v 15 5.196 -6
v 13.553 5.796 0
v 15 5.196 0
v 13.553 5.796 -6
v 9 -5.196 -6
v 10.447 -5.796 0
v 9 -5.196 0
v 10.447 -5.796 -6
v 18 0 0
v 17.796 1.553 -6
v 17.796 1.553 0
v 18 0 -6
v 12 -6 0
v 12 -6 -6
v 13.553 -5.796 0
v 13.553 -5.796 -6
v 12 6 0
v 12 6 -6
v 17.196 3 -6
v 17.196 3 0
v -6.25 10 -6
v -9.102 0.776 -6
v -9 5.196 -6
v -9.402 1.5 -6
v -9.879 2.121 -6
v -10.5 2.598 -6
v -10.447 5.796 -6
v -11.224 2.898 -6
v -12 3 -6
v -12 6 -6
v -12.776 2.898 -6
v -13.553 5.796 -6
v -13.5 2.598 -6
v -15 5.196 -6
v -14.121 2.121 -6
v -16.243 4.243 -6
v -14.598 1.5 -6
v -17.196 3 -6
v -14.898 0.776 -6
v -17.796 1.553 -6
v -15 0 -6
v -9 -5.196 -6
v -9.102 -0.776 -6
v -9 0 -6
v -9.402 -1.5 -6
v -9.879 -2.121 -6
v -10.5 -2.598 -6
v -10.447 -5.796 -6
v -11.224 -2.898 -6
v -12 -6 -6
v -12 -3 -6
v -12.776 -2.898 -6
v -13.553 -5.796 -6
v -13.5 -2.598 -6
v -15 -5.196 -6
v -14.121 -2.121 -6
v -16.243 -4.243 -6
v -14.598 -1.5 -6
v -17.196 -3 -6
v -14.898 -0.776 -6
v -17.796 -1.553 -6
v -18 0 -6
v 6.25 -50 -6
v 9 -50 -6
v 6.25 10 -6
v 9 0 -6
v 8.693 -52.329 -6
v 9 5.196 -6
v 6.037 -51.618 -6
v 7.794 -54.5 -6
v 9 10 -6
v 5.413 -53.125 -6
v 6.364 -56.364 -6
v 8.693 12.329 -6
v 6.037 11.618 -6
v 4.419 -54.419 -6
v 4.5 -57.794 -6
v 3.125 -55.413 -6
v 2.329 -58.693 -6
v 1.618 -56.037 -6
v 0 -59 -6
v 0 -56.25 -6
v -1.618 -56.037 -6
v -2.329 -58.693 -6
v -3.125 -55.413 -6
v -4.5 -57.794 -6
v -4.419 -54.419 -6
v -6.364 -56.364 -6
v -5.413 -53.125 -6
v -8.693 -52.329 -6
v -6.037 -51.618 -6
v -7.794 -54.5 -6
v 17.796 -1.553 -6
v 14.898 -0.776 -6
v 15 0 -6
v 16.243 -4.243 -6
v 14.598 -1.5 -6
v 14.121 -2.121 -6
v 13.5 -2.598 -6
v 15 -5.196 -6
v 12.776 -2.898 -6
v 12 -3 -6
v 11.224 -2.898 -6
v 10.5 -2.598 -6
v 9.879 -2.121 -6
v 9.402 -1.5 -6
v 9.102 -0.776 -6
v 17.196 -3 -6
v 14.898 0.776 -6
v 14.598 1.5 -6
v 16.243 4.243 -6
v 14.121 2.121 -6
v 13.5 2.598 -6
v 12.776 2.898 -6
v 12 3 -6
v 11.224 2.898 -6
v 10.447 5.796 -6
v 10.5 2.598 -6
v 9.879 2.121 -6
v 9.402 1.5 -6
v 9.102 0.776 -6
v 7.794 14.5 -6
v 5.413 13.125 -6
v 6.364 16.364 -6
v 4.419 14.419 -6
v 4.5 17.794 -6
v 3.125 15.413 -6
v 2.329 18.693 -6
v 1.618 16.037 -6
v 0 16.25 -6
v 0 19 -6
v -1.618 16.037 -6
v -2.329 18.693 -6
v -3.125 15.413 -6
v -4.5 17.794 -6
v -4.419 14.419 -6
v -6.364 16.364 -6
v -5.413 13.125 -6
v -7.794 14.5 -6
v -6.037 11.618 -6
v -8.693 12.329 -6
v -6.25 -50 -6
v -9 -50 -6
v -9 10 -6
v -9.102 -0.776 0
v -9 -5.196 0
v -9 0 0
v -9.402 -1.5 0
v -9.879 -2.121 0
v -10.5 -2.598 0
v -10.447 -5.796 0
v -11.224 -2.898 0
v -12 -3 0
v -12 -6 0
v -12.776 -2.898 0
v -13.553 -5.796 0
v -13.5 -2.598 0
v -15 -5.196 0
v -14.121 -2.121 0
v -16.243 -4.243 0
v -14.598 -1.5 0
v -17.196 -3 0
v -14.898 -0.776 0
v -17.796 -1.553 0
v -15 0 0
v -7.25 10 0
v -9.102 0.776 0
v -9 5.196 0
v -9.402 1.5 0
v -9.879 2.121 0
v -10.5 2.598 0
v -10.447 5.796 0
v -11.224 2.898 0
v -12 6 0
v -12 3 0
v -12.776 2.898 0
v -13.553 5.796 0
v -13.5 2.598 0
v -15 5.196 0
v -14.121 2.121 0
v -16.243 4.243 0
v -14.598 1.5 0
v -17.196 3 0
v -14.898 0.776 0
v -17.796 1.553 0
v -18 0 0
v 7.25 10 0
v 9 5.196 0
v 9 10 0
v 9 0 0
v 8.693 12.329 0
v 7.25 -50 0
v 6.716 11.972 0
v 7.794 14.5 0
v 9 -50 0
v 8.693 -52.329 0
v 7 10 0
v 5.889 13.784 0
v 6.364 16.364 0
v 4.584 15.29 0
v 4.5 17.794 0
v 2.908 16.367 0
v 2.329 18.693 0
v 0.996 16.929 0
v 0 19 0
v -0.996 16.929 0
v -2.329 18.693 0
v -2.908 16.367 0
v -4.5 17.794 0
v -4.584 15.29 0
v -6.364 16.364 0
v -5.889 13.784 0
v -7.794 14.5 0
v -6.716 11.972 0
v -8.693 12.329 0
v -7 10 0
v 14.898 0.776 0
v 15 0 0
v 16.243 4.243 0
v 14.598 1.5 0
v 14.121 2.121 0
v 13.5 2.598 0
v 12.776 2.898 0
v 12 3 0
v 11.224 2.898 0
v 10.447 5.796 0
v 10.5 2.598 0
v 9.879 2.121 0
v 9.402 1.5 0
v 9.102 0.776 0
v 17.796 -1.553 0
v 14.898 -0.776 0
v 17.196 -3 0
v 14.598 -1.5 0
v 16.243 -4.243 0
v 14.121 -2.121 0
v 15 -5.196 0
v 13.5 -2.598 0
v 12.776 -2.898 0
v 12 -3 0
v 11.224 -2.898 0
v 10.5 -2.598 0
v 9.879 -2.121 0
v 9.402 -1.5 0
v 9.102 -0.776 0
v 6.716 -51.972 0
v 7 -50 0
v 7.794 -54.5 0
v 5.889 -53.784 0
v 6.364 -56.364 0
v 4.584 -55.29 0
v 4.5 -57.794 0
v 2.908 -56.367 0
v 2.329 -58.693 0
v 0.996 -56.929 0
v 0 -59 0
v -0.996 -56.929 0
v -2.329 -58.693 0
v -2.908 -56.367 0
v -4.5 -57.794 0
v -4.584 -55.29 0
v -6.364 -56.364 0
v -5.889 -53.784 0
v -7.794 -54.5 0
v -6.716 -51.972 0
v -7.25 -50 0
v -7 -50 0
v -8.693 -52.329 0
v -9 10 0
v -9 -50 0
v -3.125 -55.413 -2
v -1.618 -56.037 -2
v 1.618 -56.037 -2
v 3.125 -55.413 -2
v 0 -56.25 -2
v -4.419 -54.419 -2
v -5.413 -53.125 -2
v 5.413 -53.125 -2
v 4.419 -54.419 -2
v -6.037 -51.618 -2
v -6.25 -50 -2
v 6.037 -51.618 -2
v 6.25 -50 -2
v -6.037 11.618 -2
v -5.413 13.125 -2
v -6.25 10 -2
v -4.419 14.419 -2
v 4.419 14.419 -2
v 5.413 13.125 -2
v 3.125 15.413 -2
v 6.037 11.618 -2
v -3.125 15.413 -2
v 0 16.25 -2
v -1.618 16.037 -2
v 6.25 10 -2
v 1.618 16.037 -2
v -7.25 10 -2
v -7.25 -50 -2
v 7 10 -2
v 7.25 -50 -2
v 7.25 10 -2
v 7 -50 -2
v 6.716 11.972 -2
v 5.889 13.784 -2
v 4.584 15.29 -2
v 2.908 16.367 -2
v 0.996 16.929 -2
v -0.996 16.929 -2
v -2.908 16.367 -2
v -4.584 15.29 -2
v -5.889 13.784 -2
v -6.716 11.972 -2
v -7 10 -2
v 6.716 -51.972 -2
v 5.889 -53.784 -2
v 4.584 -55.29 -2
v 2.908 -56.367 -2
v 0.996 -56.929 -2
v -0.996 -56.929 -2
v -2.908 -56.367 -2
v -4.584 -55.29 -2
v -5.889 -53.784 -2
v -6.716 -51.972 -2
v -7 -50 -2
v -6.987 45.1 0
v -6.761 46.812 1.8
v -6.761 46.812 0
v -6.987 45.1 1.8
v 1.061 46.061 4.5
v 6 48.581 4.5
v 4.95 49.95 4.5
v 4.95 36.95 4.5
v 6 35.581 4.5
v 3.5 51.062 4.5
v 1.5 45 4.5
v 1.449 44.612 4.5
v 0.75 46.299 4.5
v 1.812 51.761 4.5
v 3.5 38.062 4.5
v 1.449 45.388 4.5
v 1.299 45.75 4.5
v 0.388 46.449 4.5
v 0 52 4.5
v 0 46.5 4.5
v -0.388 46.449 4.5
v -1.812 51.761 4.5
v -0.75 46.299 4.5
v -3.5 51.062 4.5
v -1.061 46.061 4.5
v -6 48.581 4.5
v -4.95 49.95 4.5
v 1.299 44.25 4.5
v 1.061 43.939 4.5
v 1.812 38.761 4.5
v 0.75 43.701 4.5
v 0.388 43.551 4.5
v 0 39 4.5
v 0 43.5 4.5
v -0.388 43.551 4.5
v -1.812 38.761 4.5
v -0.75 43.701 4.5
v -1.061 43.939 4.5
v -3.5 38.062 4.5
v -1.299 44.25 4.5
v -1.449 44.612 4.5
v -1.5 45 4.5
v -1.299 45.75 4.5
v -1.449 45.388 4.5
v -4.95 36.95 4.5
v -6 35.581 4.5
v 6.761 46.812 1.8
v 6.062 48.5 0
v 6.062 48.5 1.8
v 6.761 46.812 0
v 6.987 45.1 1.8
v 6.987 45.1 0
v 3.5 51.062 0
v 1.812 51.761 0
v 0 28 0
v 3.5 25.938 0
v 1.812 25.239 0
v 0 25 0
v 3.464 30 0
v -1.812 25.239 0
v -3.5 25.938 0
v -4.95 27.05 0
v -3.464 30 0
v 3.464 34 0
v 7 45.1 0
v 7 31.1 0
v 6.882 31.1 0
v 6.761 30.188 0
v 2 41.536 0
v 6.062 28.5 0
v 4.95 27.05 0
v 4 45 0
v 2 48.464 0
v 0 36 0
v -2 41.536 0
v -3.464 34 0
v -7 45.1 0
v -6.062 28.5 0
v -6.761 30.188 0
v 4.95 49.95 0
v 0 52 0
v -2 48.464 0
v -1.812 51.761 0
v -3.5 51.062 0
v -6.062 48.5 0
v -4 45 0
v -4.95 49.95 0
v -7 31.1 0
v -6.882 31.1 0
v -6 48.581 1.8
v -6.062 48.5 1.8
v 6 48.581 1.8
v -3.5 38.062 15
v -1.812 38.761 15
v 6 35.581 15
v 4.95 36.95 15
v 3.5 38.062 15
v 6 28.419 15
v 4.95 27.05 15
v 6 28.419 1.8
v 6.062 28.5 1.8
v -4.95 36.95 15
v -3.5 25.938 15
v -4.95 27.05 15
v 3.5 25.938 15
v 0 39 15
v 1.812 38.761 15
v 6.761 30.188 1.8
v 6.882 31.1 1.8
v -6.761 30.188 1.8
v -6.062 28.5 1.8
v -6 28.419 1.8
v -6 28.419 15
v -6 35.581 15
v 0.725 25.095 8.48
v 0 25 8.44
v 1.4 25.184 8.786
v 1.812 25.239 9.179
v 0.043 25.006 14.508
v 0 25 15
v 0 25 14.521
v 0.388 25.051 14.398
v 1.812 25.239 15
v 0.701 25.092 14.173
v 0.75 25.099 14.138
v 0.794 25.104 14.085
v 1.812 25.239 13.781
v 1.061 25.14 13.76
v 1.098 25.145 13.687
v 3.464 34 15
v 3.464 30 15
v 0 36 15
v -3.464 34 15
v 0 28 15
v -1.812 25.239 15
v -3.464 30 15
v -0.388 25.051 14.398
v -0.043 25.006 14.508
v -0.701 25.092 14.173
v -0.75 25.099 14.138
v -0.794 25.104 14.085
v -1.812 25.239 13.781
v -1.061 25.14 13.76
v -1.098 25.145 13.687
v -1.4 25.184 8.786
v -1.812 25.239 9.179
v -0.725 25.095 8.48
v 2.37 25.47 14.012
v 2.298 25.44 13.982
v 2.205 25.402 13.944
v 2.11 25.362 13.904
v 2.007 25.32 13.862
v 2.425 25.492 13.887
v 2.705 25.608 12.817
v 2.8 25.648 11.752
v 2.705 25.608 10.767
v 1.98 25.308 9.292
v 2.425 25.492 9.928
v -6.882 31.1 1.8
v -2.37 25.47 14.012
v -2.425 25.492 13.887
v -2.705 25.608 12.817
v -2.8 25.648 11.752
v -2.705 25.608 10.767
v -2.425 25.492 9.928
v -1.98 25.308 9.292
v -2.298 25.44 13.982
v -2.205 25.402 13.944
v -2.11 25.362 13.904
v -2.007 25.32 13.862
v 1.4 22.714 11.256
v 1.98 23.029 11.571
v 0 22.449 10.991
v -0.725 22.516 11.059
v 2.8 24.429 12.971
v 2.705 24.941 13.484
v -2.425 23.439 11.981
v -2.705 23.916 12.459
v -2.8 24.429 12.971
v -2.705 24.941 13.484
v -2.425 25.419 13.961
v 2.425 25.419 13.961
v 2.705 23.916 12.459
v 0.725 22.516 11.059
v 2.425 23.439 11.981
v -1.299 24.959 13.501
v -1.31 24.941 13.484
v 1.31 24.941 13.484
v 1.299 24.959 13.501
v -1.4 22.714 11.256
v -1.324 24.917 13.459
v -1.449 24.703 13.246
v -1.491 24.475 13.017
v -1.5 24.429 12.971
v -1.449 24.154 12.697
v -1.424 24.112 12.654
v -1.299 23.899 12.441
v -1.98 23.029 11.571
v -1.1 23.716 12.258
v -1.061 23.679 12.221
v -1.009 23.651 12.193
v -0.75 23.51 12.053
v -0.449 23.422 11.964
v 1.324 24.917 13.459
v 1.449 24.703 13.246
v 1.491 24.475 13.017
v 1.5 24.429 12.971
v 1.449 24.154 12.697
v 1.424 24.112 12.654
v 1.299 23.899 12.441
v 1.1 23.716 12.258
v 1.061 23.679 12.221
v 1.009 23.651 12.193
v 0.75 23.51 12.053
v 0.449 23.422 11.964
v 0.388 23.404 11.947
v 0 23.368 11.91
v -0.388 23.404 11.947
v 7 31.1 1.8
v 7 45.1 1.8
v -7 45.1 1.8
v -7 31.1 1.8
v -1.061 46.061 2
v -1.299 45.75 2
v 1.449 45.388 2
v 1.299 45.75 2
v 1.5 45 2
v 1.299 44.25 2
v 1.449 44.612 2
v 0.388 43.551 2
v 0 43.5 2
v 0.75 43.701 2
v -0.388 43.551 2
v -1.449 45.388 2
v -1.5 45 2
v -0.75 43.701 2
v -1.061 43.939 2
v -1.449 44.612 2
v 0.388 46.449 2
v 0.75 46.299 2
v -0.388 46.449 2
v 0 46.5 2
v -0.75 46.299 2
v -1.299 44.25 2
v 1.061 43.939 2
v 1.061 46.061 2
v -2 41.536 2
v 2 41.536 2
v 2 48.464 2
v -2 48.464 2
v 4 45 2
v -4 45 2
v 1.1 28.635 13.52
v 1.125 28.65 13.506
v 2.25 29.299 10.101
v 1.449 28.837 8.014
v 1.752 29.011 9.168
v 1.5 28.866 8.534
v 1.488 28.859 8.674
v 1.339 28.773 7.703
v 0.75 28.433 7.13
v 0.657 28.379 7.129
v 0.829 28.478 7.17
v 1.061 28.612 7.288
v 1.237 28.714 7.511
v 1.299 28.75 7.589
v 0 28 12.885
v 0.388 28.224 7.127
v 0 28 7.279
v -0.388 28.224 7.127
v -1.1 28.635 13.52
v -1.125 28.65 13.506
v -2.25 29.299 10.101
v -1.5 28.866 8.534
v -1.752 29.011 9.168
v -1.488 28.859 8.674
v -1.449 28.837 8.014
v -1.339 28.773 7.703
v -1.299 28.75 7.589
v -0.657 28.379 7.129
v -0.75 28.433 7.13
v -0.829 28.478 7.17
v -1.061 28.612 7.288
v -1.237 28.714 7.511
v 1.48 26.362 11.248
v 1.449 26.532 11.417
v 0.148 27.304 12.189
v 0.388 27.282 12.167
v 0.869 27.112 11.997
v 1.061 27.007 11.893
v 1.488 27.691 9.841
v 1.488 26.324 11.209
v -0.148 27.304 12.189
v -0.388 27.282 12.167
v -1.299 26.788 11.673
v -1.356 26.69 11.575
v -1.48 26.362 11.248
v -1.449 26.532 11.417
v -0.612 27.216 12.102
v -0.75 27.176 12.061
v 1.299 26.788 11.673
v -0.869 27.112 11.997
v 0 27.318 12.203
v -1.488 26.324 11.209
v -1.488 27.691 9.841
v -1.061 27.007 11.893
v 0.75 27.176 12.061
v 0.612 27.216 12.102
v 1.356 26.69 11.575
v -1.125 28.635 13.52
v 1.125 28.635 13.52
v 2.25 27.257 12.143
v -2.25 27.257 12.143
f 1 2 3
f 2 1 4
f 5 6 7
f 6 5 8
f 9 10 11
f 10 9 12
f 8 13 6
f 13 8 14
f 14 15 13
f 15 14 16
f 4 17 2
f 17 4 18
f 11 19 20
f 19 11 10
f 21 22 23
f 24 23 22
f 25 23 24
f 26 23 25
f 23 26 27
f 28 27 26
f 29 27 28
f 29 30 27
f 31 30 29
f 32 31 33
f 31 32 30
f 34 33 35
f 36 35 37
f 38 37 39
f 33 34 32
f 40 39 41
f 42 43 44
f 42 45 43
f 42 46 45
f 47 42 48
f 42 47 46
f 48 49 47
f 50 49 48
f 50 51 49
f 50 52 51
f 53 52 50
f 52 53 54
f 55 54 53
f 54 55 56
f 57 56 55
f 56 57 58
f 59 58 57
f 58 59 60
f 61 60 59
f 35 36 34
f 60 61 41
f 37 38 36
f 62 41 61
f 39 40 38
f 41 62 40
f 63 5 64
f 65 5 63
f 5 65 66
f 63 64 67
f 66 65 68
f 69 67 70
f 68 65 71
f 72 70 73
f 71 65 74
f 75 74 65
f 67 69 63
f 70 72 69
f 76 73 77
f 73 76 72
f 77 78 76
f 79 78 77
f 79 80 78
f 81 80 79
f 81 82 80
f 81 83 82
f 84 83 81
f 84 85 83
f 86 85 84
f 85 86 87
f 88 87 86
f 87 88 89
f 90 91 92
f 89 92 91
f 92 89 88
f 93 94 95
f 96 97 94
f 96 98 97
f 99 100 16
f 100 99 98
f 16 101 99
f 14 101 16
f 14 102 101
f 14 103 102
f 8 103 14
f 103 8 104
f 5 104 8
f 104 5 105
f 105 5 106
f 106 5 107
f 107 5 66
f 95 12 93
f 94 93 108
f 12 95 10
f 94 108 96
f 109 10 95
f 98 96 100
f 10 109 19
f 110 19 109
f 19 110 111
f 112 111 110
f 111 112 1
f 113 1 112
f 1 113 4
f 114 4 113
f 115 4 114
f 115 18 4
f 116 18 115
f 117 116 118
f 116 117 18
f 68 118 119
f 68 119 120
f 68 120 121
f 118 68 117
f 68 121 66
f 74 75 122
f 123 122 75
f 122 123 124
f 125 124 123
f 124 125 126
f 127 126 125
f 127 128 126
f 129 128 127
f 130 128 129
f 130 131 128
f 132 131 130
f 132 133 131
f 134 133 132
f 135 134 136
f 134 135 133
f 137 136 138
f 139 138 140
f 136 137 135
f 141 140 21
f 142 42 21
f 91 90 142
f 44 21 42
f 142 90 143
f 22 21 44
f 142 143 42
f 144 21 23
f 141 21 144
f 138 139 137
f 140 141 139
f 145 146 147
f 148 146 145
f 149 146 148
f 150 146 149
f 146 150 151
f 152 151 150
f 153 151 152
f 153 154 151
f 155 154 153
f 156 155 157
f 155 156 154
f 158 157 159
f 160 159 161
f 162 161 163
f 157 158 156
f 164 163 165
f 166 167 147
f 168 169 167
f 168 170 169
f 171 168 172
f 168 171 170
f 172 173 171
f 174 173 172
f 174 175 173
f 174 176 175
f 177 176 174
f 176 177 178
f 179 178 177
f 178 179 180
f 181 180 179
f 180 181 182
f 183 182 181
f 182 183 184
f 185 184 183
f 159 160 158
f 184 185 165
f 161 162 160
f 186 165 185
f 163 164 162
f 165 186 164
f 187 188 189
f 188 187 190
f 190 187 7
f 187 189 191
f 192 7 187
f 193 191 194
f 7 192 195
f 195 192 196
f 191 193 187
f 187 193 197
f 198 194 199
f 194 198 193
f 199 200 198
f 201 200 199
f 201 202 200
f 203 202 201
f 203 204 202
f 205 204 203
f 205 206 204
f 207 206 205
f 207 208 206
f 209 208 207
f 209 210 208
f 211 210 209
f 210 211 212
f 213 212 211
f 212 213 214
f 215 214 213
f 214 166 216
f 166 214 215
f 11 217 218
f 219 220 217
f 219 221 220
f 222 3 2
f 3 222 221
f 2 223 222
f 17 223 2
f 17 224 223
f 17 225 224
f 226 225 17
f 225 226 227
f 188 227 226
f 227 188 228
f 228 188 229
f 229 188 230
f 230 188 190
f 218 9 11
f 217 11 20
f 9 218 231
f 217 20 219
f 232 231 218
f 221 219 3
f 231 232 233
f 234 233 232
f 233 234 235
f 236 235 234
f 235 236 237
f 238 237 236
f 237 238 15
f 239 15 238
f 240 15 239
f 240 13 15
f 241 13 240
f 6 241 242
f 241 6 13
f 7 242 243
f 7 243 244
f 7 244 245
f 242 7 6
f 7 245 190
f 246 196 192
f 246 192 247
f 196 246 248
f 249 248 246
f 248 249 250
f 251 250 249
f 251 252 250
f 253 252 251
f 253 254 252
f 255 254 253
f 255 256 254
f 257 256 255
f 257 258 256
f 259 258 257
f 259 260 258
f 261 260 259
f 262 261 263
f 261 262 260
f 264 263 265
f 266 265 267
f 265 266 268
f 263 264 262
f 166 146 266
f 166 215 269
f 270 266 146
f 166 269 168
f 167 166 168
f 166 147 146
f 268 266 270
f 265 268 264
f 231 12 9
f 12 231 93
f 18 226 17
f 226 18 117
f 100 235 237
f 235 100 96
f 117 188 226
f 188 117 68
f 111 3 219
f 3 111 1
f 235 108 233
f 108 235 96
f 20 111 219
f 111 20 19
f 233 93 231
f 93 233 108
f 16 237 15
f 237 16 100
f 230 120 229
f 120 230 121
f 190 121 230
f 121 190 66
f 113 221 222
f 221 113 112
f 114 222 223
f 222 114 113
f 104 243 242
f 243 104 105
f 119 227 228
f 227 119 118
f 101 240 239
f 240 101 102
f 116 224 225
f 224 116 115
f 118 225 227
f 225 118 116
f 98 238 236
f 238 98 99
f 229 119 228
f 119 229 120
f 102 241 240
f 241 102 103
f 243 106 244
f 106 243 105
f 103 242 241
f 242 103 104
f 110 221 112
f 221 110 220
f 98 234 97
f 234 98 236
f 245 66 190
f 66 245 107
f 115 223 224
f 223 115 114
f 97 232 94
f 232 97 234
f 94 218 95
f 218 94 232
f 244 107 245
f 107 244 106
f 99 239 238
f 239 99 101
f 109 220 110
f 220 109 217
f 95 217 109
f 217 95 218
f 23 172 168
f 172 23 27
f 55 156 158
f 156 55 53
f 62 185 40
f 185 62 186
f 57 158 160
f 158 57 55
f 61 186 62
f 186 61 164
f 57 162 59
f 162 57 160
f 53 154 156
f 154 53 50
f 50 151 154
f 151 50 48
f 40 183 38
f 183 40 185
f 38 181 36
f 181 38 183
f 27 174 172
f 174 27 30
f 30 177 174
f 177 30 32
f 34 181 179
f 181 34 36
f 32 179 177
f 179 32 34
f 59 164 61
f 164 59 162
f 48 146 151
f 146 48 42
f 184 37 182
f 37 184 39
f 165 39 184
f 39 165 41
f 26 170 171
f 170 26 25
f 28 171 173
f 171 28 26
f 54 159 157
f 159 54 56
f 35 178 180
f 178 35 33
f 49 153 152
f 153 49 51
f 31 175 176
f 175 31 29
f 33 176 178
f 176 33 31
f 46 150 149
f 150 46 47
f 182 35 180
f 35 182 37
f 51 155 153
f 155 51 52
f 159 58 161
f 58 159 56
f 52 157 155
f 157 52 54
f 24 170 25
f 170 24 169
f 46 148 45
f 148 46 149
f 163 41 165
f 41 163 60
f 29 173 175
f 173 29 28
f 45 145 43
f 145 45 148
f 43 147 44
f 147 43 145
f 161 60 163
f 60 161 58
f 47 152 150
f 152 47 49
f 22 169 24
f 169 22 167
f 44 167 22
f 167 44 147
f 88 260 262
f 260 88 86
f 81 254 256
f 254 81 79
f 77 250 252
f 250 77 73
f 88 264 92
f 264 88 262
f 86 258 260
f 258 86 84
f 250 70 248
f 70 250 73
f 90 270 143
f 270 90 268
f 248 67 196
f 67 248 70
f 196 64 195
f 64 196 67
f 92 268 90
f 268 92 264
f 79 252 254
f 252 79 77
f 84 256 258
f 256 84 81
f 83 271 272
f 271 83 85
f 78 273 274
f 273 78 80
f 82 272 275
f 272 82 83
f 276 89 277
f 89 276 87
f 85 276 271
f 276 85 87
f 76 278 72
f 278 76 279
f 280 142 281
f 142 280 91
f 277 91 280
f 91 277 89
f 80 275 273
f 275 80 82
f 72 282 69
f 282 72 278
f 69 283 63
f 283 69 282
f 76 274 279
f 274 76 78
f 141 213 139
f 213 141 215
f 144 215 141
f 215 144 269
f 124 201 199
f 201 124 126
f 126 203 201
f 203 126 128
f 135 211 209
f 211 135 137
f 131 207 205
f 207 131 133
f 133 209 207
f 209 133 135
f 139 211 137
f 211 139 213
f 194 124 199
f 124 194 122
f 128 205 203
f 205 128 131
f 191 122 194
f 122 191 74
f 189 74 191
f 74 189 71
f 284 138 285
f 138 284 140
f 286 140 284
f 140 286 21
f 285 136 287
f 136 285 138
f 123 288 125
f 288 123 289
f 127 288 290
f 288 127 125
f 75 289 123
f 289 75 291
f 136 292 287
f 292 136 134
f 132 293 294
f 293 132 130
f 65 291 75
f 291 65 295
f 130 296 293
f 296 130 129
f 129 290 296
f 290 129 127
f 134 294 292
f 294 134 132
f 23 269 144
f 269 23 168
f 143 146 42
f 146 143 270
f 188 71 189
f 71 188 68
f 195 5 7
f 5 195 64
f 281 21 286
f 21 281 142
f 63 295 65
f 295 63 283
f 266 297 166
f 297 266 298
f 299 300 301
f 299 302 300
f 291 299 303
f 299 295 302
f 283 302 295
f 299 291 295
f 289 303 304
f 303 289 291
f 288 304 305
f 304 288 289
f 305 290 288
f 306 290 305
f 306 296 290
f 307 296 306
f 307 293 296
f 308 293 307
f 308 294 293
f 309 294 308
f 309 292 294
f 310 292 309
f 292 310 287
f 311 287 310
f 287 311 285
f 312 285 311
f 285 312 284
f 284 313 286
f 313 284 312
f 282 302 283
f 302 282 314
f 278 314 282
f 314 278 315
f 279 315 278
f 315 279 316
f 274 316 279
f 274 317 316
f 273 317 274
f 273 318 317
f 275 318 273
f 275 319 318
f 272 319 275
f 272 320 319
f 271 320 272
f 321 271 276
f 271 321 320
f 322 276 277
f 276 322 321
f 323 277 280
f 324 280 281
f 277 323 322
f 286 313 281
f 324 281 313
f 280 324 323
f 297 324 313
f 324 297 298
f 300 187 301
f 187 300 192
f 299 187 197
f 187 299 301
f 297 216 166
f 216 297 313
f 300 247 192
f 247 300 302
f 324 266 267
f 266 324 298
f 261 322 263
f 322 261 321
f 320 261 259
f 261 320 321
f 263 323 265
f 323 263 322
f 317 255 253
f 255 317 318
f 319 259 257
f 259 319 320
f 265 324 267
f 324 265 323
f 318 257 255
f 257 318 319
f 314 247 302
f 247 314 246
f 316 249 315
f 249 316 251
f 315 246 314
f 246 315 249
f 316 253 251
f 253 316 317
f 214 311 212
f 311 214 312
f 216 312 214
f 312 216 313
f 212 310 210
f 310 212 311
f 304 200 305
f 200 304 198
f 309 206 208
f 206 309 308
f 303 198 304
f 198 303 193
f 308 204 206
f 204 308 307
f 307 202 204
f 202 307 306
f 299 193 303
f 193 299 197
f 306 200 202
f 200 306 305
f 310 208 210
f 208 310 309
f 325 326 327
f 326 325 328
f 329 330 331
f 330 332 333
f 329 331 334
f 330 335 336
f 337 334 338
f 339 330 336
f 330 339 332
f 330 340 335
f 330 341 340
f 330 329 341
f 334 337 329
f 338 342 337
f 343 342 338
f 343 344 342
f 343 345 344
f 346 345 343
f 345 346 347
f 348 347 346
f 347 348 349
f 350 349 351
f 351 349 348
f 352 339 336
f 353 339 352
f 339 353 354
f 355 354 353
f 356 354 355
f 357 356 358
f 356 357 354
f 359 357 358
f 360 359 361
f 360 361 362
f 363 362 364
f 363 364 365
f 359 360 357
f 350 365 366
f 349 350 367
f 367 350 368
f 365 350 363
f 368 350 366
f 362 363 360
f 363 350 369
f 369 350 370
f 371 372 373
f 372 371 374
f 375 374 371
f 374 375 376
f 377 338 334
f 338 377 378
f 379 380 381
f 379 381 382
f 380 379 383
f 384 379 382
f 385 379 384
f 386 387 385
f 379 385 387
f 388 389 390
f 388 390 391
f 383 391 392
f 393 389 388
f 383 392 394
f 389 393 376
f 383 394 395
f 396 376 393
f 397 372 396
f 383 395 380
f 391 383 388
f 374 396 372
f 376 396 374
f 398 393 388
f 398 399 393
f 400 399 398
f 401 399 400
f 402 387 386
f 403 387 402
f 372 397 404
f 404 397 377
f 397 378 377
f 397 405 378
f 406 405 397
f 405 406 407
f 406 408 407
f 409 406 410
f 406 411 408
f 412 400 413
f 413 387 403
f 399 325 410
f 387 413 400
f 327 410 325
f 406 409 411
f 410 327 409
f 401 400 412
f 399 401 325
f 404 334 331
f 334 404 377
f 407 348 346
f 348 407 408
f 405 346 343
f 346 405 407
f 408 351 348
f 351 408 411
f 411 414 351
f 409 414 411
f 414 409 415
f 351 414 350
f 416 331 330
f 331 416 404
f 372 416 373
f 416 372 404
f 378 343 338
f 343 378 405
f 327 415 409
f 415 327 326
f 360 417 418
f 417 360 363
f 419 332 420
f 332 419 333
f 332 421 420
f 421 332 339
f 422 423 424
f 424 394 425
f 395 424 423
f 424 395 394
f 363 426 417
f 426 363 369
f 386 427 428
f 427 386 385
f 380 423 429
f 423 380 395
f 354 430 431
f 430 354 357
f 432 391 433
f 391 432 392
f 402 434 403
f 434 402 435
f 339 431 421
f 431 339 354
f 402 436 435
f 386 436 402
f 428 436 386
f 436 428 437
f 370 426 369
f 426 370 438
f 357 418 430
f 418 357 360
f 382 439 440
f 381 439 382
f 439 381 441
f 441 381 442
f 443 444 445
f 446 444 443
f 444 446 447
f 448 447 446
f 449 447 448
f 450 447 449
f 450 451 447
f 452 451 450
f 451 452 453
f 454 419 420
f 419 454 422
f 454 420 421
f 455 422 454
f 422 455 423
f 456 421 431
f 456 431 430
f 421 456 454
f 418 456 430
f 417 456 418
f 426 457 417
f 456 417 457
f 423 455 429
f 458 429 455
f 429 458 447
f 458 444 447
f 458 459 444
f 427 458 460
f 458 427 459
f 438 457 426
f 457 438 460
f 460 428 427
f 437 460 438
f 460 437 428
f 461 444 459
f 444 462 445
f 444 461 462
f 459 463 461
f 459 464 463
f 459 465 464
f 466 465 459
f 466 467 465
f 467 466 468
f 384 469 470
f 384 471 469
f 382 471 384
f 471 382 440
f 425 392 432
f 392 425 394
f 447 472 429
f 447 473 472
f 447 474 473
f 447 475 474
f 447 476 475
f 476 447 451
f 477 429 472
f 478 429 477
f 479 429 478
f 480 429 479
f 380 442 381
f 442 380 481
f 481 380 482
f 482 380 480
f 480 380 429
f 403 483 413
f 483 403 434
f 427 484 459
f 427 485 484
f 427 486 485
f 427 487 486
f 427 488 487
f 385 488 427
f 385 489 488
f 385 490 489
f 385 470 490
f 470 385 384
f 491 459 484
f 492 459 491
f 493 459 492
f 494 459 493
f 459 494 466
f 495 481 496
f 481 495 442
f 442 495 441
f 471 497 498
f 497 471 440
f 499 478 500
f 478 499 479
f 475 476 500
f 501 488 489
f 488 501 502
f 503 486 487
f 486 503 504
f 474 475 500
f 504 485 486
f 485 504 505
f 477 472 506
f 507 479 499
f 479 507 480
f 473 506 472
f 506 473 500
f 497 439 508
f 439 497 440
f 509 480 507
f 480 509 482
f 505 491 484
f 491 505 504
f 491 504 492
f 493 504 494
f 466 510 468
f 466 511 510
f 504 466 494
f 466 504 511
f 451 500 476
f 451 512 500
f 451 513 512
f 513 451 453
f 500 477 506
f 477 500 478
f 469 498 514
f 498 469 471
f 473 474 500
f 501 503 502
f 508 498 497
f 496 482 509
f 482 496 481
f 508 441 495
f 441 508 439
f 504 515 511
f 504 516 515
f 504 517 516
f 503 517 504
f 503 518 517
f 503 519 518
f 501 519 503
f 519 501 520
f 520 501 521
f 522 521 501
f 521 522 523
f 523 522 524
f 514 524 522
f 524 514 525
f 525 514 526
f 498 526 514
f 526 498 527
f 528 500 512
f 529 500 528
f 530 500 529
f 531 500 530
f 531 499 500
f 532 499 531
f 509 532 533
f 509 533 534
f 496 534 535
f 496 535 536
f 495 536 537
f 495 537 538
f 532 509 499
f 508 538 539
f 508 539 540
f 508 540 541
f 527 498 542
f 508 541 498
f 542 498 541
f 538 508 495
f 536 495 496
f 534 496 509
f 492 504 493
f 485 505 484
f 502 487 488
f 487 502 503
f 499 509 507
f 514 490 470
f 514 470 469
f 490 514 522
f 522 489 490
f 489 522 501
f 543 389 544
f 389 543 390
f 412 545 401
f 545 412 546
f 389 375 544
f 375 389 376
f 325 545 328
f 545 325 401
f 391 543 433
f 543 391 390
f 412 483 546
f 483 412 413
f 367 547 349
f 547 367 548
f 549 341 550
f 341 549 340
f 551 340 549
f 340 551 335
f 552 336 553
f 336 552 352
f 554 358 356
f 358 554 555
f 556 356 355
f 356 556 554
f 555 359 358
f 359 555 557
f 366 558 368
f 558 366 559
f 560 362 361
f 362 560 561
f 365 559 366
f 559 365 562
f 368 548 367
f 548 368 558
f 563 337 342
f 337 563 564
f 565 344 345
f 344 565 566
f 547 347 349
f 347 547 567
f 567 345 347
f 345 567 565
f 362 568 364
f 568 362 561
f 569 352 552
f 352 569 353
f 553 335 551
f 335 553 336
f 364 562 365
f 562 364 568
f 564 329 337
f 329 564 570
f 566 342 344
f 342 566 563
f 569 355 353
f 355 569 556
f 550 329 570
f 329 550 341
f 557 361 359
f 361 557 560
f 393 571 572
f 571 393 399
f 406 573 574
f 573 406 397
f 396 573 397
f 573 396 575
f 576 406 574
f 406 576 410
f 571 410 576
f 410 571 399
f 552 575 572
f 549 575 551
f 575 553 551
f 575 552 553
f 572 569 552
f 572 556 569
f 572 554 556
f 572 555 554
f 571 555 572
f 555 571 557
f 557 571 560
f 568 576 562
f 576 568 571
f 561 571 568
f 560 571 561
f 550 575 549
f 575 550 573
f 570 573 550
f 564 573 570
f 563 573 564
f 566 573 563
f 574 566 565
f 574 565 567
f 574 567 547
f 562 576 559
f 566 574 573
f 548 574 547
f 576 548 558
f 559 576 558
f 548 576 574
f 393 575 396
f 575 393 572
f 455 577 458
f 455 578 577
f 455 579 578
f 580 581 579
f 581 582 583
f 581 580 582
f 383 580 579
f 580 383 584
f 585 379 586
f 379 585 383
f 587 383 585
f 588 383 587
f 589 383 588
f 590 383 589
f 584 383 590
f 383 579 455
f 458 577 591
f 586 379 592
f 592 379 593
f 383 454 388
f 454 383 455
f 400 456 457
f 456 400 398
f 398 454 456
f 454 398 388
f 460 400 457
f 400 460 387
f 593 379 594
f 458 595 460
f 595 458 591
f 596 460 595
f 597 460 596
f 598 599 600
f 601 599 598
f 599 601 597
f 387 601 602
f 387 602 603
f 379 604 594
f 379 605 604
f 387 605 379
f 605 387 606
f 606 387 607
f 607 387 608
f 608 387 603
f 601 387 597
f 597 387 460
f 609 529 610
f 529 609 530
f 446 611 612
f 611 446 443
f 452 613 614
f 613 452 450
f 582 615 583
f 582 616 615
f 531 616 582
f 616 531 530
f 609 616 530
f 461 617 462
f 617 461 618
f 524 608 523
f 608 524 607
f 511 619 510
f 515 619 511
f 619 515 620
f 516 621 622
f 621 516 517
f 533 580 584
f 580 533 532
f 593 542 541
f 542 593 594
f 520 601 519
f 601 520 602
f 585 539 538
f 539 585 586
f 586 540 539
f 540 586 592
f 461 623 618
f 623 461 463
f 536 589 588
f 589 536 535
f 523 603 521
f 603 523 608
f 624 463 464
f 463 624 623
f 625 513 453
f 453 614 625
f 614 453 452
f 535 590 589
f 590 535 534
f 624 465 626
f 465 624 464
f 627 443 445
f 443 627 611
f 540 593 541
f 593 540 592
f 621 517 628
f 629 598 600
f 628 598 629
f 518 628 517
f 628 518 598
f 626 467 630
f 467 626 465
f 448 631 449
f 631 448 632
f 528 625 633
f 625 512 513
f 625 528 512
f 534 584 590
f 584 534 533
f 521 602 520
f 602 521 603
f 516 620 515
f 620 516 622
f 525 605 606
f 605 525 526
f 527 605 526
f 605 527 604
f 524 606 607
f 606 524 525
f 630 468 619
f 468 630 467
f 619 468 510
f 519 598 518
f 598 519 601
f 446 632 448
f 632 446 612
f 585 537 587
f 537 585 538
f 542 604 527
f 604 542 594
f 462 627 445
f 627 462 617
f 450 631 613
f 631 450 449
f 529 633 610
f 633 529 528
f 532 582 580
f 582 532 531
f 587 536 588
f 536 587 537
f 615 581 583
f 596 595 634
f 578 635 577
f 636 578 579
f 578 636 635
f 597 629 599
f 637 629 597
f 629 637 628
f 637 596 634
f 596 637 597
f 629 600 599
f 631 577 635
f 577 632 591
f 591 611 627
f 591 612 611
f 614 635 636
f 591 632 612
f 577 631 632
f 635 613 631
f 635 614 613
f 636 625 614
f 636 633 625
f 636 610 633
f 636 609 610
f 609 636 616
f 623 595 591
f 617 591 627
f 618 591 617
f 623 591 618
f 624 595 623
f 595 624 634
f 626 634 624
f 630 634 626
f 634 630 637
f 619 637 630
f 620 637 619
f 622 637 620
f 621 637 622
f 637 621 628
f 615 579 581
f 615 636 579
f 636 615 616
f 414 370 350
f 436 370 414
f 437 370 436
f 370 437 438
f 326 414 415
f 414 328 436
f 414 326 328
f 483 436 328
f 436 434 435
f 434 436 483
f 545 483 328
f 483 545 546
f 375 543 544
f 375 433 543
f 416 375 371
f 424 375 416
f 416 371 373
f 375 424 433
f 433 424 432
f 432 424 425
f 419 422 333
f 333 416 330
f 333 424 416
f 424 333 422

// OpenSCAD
module donut (od,id,h){
    difference(){    
        cylinder (h=h, r=od/2, $fn=24);
        cylinder (h=h+5, r=id/2, $fn=24);
    }
}

id=12;
od=18;

rotate([0,180,0]){
translate([0,0,0]) rotate([0,0,0]){
	difference(){
    union(){
        translate ([-12,0,0])     donut(12,6,6);   		// agujeros tope 
        translate ([12,0,0])      donut(12,6,6);
        translate ([0,-50,0])     donut(od,id+0.5,6);			// cabezas guías
        translate ([0,10,0])      donut(od,id+0.5,6);
        translate ([-od/2,-50,0]) cube([od,60,6]);		// bloque central
    }

	translate ([-(id+0.5)/2,-50,0])    	 cube([id+0.5,60,7]);
	translate ([-(id+2.5)/2,-50,0])  cube([id+2.5,60,2]);
   translate ([0,-50,0])     		 cylinder(r=(id+2)/2,h=2);
   translate ([0,10,0])     		 cylinder(r=(id+2)/2,h=2);
	}
}
}



translate([0,40,0]){
	difference(){
        union(){
            translate ([0,5,0]) 		  							   cylinder(r=id/2+1,   h=4.5, $fn=24);
            																cylinder(r=id/2,     h=2,   $fn=24);
            translate ([0,-8,0])           					   cylinder(r=(id+2)/2, h=15,  $fn=24);
            translate ([0,-8.5,5.9])      rotate([45,0,0])  cylinder(r=5.6/2,    h=10,  $fn=24);
            translate ([-(id+2)/2,-8.9,0])  					   cube([(id+2),(id+2),4.5]);
        }

    translate ([0,5,0])  	     							cylinder(r=3/2,   h=10, $fn=24);
    translate ([0,5,0]) 		  							cylinder(r=8/2,   h=2,  $fn=6);
   
    translate ([0,-8,0])        rotate([0,0,30])   cylinder(r=8/2,   h=15, $fn=6); 		//lapiz
    translate ([0,-8.5,5.9])    rotate([45,0,0])   cylinder(r=3/2,   h=12, $fn=24);
    translate ([0,-8.5,7.9])    rotate([45,0,0])   cylinder(r=4.5/2, h=6,  $fn=6);
  
    translate ([-20-id/2,-30,1.8])                 cube([20,60,30]);
    translate ([id/2,-30,1.8])                     cube([20,60,30]);
	}
}

 
